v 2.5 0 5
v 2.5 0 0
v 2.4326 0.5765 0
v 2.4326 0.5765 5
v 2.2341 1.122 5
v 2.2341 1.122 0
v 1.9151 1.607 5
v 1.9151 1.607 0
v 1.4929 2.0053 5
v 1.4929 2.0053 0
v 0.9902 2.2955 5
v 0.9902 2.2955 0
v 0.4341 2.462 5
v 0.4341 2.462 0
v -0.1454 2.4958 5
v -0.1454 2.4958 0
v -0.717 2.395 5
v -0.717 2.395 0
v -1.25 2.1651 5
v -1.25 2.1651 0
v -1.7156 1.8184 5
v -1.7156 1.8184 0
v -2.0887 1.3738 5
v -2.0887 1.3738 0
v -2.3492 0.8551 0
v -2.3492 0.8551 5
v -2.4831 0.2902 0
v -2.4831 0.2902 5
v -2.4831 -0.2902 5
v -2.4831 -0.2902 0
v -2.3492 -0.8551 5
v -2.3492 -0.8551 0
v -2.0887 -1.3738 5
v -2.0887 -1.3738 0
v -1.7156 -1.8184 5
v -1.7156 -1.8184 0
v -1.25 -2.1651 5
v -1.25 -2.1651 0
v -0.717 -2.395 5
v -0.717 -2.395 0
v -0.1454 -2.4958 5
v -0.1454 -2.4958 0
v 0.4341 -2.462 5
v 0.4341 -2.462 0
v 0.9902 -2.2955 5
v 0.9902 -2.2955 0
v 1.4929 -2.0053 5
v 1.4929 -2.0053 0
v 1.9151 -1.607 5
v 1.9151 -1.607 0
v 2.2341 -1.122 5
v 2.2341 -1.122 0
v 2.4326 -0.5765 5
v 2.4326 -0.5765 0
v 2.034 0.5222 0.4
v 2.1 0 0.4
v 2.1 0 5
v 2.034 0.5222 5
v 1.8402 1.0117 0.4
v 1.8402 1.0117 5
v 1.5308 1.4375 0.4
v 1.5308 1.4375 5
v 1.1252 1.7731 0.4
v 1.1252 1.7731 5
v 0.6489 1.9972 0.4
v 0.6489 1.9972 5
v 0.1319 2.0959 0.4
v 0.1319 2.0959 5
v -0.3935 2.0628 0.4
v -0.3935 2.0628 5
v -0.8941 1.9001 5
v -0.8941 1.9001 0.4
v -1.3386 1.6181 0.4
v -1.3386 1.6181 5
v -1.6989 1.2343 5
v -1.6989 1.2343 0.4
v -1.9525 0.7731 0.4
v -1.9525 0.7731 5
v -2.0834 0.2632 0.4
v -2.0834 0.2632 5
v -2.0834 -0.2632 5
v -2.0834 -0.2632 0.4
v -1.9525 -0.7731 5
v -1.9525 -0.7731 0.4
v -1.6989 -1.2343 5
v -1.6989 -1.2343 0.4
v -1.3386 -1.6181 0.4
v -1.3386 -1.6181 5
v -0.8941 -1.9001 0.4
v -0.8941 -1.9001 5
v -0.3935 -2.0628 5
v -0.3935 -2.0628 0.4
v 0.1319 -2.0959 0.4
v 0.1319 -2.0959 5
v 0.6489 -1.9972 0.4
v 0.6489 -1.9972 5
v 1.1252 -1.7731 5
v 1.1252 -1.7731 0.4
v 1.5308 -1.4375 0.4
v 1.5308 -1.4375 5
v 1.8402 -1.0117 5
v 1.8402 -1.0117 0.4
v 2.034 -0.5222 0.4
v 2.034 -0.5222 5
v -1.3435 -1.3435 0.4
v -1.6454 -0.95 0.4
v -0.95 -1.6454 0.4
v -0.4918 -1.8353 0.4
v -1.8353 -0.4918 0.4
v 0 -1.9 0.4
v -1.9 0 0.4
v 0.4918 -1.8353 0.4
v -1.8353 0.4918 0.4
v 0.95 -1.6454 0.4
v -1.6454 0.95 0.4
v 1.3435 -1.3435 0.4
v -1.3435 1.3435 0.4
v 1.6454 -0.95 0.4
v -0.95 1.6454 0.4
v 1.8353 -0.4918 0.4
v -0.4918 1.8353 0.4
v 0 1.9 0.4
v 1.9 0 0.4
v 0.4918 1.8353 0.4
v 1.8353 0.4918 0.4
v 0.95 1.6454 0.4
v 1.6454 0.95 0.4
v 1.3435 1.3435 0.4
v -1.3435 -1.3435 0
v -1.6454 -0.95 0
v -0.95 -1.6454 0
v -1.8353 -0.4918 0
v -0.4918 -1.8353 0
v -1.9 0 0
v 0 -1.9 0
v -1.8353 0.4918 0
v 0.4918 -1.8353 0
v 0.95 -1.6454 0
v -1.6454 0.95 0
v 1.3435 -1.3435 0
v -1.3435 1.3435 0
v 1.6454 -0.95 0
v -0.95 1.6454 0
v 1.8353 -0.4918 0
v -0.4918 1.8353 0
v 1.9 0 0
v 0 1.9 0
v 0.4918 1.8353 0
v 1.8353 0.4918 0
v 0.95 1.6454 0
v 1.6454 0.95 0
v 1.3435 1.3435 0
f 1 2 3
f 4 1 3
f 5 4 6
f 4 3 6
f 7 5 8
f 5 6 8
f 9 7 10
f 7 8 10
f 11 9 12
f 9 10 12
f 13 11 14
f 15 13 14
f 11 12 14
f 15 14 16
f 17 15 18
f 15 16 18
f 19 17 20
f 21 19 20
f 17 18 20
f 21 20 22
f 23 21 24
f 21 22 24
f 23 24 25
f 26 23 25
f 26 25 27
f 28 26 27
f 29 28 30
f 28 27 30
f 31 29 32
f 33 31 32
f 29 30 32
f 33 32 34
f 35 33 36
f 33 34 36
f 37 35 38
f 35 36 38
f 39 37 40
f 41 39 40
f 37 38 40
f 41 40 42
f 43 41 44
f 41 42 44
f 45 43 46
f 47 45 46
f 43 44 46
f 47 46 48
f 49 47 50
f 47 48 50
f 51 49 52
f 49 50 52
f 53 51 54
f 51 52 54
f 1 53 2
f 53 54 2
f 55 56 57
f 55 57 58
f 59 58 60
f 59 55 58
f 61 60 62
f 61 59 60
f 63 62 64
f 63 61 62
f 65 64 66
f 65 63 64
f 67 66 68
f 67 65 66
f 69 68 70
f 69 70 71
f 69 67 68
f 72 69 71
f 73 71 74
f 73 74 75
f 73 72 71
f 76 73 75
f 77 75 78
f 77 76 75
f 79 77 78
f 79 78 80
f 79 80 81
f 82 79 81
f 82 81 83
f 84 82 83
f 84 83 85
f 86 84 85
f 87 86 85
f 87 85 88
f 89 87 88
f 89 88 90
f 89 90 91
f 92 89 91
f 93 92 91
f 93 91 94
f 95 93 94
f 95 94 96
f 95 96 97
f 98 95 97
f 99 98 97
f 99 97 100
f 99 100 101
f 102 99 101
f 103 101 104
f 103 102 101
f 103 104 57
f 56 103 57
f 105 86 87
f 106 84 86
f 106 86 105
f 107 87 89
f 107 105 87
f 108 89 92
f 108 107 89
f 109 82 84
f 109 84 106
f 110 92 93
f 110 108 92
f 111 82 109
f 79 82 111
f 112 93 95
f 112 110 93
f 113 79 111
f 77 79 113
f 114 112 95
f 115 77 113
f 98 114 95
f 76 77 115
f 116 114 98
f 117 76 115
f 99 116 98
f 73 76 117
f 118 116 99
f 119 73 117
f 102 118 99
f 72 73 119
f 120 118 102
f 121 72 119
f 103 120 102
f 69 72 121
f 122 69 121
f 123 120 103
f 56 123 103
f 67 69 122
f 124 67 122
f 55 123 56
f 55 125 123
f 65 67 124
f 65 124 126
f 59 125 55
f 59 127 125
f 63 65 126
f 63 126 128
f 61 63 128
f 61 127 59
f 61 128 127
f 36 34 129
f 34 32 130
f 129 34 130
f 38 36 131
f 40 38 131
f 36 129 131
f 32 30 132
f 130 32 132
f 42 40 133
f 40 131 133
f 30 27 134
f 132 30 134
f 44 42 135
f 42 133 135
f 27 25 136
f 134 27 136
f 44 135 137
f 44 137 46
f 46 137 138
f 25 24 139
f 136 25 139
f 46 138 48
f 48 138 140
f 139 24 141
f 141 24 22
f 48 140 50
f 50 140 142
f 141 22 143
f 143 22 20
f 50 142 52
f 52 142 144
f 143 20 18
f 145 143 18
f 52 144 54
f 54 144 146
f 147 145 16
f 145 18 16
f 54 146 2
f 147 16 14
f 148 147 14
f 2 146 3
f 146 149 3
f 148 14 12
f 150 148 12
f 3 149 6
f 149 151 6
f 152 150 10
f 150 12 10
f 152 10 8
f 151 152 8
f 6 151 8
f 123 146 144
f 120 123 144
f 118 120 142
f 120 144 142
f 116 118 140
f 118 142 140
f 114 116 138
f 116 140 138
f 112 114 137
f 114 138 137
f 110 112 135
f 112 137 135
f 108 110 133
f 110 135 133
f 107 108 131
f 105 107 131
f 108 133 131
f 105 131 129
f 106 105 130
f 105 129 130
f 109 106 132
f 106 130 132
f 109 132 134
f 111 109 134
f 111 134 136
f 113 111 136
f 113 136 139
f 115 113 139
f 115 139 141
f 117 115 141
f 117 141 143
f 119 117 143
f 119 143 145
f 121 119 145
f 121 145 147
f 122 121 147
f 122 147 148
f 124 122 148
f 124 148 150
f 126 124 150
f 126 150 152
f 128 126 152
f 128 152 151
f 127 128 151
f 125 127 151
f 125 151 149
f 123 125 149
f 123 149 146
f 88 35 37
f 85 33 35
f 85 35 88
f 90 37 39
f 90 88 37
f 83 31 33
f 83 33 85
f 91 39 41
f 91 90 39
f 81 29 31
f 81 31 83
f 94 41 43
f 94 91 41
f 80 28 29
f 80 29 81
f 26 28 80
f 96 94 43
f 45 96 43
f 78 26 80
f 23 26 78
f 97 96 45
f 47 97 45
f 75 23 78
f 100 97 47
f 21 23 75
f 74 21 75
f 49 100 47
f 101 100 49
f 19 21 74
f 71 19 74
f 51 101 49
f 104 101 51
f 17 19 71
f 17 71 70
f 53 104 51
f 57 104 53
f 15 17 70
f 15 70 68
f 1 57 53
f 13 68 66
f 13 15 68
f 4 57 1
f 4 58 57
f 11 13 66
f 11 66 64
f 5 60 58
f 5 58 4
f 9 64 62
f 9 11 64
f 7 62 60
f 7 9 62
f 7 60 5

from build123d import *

# Parameters (mm, degrees)
F0_R     = 2.5
F1_DEPTH = 5
F2_T     = -0.4
F3_R     = 1.9
F4_DEPTH = 25


with BuildPart() as f1:
    # F0 (on Top) → F1 (new body)
    with BuildSketch(Plane.XY):
        Circle(F0_R)
    extrude(amount=F1_DEPTH)

    # F2
    f2_openings = [f1.faces().sort_by_distance(p)[0] for p in [
        (0, 0, 5),
    ]]
    offset(amount=F2_T, openings=f2_openings)

    # F3 (on face) → F4 (cut)
    with BuildSketch(Plane(origin=(0, 0, 0), x_dir=(1, 0, 0), z_dir=(0, 0, -1))):
        Circle(F3_R)
    extrude(amount=-F4_DEPTH, mode=Mode.SUBTRACT)


solid = f1.part
